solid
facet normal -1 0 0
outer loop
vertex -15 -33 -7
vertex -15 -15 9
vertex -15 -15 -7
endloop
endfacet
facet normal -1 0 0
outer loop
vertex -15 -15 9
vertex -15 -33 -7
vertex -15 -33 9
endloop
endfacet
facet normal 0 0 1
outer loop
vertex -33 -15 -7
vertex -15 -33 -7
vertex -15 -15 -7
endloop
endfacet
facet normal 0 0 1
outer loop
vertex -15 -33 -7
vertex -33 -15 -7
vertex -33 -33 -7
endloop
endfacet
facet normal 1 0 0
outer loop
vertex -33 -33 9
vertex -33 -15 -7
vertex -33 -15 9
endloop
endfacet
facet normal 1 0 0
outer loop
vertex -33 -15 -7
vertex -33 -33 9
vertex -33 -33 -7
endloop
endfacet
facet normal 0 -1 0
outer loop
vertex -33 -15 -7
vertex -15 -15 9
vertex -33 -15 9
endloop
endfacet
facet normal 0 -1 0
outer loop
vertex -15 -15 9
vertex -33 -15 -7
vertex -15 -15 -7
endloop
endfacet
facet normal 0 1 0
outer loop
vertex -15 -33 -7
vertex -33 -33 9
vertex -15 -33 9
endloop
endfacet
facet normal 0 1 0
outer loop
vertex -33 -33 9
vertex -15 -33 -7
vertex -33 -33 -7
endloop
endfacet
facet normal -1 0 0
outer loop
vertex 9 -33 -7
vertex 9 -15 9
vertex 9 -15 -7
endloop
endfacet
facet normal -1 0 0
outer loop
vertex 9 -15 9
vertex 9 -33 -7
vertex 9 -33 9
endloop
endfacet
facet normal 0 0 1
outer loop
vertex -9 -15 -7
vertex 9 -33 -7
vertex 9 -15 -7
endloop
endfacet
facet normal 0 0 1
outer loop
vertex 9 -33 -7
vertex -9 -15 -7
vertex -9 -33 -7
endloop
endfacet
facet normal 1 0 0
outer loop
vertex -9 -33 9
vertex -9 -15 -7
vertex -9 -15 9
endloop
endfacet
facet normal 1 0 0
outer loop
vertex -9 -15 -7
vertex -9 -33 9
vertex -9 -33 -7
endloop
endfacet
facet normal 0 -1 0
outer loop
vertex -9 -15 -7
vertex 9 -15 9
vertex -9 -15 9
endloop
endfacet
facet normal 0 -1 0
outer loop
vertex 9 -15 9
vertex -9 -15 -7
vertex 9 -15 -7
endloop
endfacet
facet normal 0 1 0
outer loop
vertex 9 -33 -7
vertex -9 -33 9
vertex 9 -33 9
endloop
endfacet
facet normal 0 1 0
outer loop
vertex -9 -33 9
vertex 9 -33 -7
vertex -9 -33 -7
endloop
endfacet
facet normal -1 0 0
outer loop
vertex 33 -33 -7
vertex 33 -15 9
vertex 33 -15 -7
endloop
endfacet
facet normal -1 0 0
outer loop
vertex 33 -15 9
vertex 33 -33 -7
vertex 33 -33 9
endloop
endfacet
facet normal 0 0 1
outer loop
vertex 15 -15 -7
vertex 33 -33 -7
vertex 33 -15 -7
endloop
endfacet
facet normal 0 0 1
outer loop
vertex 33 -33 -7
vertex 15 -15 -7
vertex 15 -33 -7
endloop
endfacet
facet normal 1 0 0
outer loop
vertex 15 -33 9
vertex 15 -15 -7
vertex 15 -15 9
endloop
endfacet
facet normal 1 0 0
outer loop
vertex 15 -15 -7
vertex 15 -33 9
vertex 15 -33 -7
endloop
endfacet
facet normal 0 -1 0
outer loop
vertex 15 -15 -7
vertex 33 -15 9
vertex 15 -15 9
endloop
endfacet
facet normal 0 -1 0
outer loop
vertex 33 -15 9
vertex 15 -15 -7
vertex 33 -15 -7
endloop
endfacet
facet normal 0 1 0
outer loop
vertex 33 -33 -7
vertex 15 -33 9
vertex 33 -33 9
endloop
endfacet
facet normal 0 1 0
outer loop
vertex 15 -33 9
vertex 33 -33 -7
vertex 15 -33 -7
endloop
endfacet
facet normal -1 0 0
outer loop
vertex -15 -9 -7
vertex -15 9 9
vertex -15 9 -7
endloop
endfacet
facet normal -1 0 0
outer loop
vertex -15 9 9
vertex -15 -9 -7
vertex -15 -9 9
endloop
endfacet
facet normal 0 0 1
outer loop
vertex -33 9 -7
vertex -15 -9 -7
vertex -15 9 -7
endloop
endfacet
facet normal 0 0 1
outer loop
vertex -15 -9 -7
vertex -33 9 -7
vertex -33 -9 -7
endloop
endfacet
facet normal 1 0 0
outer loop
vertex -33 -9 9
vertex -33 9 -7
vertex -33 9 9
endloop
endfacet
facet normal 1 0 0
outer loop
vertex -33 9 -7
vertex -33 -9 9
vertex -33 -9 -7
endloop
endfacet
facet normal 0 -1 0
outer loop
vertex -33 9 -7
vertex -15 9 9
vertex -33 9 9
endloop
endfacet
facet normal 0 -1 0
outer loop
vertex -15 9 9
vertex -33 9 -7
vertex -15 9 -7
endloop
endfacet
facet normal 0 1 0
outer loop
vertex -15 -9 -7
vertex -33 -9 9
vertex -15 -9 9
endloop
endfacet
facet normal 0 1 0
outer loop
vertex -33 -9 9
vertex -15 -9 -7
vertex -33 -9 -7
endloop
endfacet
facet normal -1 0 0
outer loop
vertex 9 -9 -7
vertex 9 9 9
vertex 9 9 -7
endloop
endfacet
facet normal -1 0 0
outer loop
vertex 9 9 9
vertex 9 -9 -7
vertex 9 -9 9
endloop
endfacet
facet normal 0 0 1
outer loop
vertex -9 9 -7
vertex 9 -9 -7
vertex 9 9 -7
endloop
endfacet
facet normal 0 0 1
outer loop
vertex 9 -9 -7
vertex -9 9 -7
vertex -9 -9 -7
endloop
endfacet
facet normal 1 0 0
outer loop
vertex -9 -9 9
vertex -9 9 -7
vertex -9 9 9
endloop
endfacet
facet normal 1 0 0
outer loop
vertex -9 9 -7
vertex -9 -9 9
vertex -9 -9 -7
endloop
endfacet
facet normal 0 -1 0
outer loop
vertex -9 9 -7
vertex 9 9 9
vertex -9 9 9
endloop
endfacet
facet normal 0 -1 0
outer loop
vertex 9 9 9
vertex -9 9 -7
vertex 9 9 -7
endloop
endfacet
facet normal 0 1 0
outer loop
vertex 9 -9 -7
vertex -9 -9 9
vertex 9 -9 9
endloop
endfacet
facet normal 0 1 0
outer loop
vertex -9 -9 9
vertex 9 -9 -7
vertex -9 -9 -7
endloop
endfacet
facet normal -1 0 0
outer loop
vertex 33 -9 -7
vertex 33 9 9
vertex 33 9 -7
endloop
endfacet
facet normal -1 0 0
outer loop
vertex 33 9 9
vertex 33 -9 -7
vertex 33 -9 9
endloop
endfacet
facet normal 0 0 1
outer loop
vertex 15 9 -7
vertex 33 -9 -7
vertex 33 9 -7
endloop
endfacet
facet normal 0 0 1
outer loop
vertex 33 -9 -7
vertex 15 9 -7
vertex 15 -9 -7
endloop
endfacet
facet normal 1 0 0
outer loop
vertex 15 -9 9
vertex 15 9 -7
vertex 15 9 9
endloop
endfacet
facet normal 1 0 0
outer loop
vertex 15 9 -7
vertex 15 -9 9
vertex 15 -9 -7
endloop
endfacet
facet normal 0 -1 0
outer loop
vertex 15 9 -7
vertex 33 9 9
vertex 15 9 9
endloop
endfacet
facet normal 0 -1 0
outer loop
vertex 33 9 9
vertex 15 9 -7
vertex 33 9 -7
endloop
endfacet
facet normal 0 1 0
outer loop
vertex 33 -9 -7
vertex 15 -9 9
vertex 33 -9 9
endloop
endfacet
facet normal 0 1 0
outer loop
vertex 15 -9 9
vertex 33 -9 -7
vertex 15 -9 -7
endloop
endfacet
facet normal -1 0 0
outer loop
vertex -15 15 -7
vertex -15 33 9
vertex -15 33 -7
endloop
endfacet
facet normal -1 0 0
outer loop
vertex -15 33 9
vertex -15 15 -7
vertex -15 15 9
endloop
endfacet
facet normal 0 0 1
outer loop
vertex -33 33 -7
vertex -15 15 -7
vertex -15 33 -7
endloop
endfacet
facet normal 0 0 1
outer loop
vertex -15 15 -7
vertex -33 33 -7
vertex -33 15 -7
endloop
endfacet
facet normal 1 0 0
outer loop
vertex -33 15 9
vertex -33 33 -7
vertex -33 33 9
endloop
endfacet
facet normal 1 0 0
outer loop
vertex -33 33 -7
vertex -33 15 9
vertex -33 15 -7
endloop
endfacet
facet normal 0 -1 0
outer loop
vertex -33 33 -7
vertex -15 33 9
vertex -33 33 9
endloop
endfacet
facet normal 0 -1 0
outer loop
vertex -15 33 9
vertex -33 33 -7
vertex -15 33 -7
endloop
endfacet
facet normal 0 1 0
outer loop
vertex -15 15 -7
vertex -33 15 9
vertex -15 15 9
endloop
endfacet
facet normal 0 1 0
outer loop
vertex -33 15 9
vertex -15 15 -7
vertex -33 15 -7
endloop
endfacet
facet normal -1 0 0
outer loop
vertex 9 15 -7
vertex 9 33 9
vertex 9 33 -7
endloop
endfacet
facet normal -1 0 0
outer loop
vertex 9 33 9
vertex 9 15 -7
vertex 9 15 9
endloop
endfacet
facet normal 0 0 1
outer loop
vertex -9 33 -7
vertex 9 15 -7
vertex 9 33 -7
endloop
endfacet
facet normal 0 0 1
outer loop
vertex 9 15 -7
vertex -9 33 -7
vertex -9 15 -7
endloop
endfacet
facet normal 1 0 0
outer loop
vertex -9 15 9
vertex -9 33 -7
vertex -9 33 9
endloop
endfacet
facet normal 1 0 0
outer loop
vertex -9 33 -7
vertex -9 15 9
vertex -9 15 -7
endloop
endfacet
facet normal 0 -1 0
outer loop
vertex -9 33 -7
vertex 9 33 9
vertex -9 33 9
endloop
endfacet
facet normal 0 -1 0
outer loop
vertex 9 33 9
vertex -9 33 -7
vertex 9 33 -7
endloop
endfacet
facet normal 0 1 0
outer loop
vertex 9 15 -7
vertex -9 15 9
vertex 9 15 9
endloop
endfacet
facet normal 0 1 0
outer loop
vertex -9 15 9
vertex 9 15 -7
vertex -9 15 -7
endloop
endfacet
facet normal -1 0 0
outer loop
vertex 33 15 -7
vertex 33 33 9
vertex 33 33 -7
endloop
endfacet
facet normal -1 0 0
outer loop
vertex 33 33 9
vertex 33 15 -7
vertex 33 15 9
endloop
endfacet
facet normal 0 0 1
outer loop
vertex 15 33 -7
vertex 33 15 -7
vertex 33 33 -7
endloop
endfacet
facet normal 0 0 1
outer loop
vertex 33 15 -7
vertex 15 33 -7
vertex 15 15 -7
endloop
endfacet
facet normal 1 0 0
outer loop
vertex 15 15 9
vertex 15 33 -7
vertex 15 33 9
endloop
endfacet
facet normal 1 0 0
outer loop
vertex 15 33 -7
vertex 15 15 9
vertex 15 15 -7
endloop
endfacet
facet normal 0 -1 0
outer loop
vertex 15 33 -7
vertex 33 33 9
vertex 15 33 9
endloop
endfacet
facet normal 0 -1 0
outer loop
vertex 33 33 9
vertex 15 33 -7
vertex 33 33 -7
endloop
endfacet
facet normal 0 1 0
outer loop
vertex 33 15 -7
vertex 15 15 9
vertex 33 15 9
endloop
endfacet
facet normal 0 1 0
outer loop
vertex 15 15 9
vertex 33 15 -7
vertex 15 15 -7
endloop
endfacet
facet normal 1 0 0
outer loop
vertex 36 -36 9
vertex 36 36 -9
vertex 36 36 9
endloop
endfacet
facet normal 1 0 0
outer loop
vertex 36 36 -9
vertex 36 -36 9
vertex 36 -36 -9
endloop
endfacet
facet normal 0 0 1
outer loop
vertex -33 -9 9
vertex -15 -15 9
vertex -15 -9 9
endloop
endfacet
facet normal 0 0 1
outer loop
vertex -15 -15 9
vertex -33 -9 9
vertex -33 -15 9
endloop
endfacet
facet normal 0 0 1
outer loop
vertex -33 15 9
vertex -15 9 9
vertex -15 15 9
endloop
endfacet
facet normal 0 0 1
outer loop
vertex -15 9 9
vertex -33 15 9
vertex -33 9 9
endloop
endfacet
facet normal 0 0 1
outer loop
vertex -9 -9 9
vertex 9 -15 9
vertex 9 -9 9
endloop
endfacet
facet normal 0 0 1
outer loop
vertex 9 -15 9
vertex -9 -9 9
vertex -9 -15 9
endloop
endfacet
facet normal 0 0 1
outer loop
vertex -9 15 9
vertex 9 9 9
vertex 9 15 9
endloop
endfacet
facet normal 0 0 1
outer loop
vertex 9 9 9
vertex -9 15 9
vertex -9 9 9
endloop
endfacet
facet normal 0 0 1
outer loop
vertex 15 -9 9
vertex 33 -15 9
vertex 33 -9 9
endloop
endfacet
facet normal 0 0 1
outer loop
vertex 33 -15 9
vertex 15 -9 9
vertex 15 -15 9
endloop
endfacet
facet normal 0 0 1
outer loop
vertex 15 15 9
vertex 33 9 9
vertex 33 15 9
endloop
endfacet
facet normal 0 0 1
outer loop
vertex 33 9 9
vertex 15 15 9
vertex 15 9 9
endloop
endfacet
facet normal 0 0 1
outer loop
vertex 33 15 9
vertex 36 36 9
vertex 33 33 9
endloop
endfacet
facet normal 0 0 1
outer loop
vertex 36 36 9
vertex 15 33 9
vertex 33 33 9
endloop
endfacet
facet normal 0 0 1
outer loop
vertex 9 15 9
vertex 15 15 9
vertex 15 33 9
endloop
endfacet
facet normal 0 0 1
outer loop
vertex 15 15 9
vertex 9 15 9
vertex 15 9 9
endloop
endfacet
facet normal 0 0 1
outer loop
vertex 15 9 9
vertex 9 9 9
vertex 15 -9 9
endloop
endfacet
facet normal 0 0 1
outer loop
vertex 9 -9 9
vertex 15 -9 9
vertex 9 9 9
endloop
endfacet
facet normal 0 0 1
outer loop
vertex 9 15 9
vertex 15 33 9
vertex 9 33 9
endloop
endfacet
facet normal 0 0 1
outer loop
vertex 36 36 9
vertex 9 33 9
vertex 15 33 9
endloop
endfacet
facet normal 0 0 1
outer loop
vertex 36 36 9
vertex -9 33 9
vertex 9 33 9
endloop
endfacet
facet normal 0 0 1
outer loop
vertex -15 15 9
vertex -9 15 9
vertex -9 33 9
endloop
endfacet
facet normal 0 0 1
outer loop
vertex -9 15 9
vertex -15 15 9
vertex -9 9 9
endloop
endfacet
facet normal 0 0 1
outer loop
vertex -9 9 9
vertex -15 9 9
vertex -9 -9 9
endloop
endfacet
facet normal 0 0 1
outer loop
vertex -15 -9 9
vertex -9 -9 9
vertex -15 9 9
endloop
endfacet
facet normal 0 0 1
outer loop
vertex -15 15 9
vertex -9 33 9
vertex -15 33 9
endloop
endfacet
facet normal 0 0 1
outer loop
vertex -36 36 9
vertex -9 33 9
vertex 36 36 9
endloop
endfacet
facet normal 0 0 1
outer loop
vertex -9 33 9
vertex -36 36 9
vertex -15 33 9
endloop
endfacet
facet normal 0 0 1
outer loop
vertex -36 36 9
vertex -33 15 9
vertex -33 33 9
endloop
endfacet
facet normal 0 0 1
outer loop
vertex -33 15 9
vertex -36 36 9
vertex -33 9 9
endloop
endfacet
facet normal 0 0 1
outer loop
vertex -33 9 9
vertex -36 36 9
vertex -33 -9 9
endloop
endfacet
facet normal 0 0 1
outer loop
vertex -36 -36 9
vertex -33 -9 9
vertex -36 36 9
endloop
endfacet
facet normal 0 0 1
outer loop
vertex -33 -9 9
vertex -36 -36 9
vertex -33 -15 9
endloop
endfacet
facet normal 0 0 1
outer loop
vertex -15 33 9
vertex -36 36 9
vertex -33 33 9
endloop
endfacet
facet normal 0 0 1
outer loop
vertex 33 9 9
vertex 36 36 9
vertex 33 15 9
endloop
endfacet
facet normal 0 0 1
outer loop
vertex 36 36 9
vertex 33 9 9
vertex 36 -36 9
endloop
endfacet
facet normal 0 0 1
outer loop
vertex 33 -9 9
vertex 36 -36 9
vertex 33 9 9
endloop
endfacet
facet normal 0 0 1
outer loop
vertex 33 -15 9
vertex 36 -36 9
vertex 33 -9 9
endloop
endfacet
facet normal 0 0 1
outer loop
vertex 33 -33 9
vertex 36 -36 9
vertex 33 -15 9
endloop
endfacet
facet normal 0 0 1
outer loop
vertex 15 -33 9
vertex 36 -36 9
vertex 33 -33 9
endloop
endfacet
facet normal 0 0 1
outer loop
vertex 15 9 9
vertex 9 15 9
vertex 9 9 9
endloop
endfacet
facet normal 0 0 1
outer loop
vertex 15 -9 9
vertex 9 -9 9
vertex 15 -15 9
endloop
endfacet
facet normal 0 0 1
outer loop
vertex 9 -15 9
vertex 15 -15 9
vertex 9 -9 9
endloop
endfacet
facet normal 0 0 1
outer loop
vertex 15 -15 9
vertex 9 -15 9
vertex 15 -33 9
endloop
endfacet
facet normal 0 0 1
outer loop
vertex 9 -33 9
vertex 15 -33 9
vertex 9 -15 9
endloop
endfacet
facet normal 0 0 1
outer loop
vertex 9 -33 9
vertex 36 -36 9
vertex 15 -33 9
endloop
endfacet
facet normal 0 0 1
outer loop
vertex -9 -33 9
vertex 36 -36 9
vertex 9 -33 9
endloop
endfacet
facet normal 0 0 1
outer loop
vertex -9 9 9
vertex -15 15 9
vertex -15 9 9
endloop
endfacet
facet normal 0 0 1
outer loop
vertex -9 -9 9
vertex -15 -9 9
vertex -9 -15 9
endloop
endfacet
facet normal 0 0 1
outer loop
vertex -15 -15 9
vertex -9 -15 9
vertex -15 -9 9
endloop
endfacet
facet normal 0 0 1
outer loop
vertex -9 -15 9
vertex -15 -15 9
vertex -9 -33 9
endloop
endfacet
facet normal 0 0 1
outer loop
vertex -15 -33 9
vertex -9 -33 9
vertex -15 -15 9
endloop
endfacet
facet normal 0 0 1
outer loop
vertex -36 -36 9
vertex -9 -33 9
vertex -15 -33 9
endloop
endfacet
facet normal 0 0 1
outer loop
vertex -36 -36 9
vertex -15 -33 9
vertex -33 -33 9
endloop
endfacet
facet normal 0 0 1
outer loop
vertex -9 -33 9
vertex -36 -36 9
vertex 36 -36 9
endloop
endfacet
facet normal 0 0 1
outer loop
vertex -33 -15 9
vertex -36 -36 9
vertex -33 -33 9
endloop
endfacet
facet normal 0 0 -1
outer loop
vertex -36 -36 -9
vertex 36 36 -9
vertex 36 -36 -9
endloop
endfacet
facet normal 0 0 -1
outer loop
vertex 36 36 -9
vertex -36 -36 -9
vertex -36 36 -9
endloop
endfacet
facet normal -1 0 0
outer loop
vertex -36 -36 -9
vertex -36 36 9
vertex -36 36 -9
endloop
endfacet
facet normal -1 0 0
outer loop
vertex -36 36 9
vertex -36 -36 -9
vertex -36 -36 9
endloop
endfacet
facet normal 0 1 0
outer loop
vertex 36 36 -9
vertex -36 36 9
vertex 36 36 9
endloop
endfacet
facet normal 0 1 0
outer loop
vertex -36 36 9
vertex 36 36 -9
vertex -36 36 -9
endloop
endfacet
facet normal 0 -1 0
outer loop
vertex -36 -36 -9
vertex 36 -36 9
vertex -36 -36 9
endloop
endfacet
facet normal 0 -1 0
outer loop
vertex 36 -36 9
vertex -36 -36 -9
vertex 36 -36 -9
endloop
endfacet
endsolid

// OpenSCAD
$fn = 32;
// ----------------------------------------------------------------------
// Pocket plate 72 x 72 x 18
// 3 x 3 pockets 18 mm square, 16 mm deep
// ----------------------------------------------------------------------

// --- parameters (mm) ---
thickness = 18;  // plate thickness
floor_t = 2;     // material left under each pocket
pocket = 18;     // pocket side length
pitch_x = 24;    // pocket pitch along X
pitch_y = 24;    // pocket pitch along Y
cols = 3;        // pockets per row
rows = 3;        // rows of pockets

// --- derived feature positions (mm) ---
depth = thickness - floor_t;        // = 16   pocket depth, down to the floor
span_x = (cols - 1) * pitch_x;      // = 48   distance between outer pockets
span_y = (rows - 1) * pitch_y;      // = 48   distance between outer pocket rows
origin_x = -span_x / 2;             // = -24   X of the first pocket
origin_y = -span_y / 2;             // = -24   Y of the first pocket
plate = [span_x + pocket + 6, span_y + pocket + 6, thickness];  // = [72, 72, 18]   overall size: pockets plus 3 mm of wall on each side
feature_centers = [
  [origin_x + 0 * pitch_x, origin_y + 0 * pitch_y],
  [origin_x + 1 * pitch_x, origin_y + 0 * pitch_y],
  [origin_x + 2 * pitch_x, origin_y + 0 * pitch_y],
  [origin_x + 0 * pitch_x, origin_y + 1 * pitch_y],
  [origin_x + 1 * pitch_x, origin_y + 1 * pitch_y],
  [origin_x + 2 * pitch_x, origin_y + 1 * pitch_y],
  [origin_x + 0 * pitch_x, origin_y + 2 * pitch_y],
  [origin_x + 1 * pitch_x, origin_y + 2 * pitch_y],
  [origin_x + 2 * pitch_x, origin_y + 2 * pitch_y]
];   // pocket centres, used verbatim by the cutter loop

// plate outline, then one pocket per centre in feature_centers
difference() {
  cube(plate, center = true);
  for (centre = feature_centers)
    translate([centre[0] - pocket / 2, centre[1] - pocket / 2, plate[2] / 2 - depth])
      cube([pocket, pocket, depth + 1]);  // centred on the declared pocket centre
}
